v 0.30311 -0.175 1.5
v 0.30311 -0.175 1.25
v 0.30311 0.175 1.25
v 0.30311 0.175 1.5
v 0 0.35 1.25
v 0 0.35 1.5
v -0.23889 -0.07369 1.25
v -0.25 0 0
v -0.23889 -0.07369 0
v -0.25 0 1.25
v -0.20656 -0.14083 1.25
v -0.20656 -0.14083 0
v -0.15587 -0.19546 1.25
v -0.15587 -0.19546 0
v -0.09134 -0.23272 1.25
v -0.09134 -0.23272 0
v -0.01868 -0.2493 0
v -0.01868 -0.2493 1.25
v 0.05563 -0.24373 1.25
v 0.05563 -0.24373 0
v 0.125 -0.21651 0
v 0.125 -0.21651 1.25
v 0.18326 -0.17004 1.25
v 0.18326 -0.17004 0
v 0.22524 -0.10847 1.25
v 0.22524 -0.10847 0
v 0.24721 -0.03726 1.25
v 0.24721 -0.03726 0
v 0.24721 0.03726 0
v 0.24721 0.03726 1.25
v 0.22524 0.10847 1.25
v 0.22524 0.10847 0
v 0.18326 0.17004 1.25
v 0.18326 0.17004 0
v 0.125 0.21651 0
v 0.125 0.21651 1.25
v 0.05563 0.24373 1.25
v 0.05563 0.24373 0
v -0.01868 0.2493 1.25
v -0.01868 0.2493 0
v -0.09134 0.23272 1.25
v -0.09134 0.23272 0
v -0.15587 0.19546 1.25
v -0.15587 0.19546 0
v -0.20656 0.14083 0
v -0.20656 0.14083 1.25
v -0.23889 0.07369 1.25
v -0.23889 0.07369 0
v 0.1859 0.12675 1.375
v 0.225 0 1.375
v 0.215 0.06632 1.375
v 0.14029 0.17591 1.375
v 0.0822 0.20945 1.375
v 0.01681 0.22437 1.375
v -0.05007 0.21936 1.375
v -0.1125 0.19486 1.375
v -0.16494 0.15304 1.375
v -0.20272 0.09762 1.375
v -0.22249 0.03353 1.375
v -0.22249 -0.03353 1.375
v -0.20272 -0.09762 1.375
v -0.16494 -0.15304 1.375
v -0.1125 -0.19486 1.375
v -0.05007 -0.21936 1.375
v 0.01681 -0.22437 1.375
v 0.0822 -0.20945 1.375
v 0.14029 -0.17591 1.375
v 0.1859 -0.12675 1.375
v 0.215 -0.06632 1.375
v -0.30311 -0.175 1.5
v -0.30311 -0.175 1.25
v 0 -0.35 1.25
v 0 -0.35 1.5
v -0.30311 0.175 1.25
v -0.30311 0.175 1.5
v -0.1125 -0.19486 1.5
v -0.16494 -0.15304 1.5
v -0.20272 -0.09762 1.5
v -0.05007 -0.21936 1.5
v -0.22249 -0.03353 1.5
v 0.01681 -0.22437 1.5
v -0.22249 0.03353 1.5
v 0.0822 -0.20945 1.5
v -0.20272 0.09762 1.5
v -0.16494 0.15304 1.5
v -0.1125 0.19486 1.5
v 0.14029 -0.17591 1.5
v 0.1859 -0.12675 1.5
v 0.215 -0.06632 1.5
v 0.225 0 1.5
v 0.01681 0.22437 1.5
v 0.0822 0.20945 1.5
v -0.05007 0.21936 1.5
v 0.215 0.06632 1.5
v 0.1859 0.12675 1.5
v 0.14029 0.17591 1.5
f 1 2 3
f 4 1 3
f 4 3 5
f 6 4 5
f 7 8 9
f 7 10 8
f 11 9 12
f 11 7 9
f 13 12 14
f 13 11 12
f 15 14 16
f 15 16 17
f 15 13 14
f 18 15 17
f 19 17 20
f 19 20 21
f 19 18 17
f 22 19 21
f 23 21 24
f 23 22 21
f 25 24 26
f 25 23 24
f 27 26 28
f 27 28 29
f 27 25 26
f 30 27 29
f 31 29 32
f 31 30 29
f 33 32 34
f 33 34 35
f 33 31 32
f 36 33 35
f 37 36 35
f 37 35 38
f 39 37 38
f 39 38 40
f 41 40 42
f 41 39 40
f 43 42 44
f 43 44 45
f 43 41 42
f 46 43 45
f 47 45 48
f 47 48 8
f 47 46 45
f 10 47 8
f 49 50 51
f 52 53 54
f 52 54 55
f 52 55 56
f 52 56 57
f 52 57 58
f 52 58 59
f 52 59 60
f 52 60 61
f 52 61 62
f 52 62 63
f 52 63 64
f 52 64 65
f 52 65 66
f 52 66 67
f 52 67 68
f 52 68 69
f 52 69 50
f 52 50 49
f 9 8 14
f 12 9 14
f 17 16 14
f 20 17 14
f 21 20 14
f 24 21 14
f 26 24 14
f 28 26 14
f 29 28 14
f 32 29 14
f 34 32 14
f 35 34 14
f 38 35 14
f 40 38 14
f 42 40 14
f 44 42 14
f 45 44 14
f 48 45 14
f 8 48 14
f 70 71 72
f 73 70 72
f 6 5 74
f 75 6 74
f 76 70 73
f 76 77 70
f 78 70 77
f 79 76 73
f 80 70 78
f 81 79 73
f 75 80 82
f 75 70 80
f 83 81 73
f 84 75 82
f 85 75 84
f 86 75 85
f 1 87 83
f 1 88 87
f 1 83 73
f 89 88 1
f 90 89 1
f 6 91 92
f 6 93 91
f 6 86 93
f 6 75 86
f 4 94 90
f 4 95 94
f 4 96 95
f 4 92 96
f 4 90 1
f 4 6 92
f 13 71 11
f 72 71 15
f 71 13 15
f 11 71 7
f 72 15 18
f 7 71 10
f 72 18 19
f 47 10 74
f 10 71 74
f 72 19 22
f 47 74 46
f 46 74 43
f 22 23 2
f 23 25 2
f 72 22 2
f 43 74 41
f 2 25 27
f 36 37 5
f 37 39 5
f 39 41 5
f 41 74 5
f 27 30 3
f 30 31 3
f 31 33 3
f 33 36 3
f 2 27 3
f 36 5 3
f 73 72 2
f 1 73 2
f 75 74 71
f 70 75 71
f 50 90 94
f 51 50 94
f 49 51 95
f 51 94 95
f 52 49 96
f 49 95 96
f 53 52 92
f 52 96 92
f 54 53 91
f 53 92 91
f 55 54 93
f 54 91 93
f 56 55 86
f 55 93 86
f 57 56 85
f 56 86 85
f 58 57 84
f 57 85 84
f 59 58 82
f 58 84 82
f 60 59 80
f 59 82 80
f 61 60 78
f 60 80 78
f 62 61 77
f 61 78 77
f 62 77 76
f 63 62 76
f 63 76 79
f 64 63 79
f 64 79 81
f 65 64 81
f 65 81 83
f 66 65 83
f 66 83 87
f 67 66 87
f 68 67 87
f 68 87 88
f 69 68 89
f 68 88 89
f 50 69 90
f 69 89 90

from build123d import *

# Parameters (mm, degrees)
F0_W     = 0.25
F0_H     = 1.25
F2_R     = 0.25
F3_DEPTH = 0.25
F4_R     = 0.225
F5_DEPTH = 0.125


with BuildPart() as f1:
    # F0 (on Front) → F1 (revolve)
    with BuildSketch(Plane.XZ):
        with Locations((-0.125, 0.625)):
            Rectangle(F0_W, F0_H)
    revolve(axis=Axis((0, 0, 0.625), (0, 0, 1)))

    # F2 (on face) → F3 (join)
    with BuildSketch(Plane.XY.offset(1.25)):
        Polygon((0.3031088913, 0.175), (0, 0.35), (-0.3031088913, 0.175), (-0.3031088913, -0.175), (0, -0.35), (0.3031088913, -0.175), align=None)
        Circle(F2_R, mode=Mode.SUBTRACT)
        Circle(F2_R)
    extrude(amount=F3_DEPTH)

    # F4 (on face) → F5 (cut)
    with BuildSketch(Plane.XY.offset(1.5)):
        Circle(F4_R)
    extrude(amount=-F5_DEPTH, mode=Mode.SUBTRACT)


solid = f1.part
